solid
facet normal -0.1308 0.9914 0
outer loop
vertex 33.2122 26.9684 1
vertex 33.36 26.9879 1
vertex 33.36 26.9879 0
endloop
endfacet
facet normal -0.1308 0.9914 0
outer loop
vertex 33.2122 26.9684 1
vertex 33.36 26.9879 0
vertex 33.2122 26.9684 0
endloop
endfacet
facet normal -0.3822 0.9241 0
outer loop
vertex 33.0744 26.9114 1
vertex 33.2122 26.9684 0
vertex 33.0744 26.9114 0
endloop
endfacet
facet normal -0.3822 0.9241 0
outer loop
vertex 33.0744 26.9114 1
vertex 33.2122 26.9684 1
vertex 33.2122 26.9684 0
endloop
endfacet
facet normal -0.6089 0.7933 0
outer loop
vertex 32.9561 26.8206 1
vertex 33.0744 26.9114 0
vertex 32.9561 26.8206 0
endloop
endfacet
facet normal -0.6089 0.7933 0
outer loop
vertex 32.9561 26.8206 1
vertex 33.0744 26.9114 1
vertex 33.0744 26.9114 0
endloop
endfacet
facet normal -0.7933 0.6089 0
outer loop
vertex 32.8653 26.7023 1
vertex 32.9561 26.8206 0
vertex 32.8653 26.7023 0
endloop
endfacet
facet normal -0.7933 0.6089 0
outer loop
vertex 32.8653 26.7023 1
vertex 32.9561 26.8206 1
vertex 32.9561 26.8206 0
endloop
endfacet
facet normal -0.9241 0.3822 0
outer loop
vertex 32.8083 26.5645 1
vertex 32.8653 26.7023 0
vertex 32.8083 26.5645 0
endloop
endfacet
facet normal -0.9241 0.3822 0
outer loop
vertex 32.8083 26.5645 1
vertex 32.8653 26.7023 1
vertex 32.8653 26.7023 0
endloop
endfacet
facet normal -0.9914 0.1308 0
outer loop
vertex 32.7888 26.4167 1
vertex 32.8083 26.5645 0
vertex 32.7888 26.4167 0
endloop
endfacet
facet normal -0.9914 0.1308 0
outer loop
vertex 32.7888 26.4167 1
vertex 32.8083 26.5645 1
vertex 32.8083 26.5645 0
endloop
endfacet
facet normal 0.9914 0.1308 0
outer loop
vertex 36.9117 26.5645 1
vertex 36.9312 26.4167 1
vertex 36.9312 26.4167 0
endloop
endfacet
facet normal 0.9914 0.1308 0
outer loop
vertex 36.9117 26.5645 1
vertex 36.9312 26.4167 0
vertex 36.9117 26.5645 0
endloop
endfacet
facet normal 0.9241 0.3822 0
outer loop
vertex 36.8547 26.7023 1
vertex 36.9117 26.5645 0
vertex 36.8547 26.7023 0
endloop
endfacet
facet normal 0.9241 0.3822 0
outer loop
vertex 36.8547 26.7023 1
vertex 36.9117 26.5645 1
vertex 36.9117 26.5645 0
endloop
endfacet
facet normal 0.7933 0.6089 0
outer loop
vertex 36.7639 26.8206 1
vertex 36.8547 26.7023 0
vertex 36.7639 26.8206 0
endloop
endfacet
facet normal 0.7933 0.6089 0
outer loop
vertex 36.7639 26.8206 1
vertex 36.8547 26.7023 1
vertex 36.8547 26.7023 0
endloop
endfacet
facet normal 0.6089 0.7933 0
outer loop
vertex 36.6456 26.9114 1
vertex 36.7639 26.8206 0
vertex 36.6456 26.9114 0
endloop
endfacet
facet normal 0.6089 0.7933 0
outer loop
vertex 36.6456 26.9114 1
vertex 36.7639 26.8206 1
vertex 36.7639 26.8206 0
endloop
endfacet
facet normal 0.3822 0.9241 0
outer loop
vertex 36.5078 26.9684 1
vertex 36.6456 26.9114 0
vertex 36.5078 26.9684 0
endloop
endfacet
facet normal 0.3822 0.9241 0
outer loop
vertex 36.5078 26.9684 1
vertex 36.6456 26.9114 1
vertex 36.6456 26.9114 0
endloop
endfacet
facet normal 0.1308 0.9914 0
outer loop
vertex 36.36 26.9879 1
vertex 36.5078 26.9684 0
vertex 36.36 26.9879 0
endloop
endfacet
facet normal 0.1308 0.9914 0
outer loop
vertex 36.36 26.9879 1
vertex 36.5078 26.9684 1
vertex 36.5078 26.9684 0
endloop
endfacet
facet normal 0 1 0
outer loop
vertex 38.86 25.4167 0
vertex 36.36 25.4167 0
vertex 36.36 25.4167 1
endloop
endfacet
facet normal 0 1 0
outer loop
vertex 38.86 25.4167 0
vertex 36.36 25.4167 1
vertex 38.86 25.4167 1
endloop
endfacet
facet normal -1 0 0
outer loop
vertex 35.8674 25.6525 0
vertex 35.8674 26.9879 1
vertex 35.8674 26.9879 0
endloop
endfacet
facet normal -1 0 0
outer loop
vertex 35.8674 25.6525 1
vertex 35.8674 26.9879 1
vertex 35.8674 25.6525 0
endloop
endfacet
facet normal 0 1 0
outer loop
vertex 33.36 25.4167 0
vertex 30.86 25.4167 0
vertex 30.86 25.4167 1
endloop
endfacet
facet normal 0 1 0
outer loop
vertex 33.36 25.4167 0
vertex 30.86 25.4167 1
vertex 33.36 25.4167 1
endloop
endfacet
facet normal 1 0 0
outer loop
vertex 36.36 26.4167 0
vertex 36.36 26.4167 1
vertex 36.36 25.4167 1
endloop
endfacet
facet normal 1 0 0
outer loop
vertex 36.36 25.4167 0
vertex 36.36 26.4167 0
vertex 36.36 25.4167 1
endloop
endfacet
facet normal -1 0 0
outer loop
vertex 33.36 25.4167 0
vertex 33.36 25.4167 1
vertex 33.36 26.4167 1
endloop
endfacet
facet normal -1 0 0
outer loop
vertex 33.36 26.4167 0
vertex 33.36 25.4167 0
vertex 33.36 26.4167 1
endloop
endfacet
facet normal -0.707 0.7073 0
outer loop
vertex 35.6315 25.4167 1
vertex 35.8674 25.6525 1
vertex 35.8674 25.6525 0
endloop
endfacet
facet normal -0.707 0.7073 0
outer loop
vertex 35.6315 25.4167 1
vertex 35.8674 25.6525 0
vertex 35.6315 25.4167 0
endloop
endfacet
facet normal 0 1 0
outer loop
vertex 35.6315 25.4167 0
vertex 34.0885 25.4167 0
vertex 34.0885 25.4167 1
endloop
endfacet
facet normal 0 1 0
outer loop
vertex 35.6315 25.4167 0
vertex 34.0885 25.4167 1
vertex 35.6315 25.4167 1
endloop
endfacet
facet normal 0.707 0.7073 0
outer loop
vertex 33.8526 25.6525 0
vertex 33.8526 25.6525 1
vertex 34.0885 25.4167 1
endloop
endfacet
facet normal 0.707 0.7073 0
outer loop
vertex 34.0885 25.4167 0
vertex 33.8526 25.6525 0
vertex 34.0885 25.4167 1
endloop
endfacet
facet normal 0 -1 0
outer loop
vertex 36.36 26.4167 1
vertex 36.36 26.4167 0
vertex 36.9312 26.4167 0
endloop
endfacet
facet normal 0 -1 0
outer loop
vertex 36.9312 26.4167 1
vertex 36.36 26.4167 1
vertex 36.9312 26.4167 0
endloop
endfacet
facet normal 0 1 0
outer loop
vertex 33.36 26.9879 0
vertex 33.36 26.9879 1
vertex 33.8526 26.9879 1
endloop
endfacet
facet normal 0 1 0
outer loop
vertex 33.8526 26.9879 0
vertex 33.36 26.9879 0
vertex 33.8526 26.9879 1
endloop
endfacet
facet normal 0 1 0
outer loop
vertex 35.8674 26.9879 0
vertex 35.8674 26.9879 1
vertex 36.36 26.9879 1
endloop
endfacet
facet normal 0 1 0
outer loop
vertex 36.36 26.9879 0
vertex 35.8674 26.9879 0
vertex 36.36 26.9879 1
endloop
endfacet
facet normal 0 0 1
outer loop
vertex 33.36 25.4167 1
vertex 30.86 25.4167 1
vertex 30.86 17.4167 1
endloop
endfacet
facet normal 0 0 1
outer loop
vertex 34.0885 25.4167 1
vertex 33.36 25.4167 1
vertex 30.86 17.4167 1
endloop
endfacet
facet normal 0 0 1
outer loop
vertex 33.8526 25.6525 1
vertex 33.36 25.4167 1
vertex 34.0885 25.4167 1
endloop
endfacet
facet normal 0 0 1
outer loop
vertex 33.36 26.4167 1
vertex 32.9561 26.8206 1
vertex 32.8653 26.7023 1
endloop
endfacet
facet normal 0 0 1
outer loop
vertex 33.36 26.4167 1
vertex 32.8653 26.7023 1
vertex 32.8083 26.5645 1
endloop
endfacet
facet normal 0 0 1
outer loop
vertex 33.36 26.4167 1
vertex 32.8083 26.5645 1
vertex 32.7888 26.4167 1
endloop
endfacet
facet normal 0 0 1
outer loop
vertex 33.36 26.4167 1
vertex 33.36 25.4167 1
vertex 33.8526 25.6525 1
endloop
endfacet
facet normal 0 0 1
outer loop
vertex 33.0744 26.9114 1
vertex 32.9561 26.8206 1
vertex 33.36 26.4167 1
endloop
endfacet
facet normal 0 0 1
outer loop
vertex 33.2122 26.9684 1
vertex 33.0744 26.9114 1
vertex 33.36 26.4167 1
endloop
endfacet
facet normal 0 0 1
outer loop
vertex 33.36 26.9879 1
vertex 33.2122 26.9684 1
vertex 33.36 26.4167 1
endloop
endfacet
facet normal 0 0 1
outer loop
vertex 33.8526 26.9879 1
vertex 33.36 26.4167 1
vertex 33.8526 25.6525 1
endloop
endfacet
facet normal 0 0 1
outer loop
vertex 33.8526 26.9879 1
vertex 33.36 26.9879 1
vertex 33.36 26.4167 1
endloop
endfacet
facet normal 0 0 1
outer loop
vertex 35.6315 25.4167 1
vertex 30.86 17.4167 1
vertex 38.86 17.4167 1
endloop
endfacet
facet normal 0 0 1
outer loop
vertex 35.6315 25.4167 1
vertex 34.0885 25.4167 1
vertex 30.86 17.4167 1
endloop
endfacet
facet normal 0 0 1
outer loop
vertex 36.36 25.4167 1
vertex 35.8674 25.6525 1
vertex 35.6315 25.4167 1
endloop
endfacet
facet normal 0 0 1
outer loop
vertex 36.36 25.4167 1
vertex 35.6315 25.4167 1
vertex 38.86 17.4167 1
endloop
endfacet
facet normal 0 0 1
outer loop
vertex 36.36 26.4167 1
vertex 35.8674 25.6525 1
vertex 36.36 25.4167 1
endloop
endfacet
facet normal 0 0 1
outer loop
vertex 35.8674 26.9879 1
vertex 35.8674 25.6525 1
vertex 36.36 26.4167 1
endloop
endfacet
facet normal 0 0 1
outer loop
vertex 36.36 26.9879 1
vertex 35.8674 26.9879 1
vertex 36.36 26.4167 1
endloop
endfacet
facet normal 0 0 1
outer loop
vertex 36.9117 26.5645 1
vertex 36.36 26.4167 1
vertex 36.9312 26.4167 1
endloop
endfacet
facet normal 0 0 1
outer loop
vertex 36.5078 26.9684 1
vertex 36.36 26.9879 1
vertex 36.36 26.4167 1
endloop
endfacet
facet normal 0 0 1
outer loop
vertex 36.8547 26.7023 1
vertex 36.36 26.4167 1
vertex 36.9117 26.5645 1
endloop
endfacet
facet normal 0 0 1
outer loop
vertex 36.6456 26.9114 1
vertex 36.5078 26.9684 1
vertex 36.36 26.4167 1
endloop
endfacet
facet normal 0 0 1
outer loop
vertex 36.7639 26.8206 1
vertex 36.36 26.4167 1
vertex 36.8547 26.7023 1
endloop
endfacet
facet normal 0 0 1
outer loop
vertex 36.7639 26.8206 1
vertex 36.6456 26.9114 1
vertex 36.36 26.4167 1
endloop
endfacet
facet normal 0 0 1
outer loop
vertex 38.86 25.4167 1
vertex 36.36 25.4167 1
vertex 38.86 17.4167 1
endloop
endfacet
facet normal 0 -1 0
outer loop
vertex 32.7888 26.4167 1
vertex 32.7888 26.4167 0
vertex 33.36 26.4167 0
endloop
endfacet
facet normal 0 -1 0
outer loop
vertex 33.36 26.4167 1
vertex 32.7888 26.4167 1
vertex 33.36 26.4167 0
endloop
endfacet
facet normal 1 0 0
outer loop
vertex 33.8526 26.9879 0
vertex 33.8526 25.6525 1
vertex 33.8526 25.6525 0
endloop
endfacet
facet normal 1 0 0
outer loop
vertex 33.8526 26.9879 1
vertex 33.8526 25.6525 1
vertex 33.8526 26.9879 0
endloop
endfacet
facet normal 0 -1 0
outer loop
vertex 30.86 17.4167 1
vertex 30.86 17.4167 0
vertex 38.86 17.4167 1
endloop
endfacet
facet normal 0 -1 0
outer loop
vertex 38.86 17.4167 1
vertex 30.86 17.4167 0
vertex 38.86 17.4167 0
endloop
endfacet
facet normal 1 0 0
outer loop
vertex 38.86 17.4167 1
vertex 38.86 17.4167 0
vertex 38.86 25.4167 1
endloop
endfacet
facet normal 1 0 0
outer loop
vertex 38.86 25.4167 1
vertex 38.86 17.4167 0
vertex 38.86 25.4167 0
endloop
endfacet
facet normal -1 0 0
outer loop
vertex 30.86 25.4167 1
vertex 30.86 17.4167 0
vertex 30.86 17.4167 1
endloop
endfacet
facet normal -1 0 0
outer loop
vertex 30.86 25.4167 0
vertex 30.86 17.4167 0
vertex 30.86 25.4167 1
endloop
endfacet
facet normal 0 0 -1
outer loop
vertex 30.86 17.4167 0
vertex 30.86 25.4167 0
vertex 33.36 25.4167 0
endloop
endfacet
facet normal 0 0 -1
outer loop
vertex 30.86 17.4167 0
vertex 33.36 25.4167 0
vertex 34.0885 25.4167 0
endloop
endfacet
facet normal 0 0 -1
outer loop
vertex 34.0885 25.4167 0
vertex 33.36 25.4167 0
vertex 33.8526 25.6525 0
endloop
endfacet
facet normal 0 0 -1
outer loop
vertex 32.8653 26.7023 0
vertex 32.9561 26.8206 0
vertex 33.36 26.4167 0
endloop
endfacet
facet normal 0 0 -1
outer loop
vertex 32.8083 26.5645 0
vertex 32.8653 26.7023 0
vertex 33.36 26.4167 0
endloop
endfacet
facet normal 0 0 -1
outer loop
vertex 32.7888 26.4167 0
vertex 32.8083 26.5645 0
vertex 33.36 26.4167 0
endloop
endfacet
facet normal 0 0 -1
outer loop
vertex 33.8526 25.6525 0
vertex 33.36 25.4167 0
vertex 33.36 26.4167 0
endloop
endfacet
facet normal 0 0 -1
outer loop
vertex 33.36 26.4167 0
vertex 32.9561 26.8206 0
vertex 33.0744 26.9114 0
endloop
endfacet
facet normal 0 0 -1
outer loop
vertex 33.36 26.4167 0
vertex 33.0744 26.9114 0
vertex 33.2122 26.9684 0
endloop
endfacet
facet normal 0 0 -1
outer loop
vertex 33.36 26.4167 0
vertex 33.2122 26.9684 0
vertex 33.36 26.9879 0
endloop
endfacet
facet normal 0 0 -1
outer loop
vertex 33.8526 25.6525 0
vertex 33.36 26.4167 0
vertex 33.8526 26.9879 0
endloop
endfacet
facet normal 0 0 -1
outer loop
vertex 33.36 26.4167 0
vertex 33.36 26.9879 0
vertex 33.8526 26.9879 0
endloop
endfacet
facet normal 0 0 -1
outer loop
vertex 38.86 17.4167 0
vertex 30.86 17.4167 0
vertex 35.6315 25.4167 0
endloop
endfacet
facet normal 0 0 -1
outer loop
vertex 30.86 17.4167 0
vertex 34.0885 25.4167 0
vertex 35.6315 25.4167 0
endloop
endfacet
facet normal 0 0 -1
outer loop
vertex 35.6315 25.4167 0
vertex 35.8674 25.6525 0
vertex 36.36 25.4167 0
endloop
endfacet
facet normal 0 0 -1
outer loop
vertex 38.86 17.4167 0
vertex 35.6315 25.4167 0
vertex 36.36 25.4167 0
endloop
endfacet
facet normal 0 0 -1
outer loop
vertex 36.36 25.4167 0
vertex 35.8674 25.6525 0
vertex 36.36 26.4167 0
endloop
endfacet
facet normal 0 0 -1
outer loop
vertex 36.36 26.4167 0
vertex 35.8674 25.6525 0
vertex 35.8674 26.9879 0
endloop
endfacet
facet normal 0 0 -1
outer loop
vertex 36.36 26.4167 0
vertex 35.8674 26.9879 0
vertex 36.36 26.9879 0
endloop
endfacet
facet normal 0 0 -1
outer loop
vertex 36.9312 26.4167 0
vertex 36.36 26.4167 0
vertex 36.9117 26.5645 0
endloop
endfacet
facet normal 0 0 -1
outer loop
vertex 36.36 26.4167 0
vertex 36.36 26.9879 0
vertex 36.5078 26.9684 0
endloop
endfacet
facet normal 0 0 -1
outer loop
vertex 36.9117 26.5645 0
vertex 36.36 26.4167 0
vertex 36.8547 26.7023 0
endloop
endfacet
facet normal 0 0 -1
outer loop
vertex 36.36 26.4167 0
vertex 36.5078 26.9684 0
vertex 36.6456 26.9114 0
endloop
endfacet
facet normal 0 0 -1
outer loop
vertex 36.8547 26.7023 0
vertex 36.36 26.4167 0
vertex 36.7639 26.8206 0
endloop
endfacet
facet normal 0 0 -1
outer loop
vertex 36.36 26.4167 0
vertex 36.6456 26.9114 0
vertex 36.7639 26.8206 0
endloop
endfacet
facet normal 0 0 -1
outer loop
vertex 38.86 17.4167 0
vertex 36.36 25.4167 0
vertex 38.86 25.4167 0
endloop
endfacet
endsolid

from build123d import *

# Parameters (mm, degrees)
EXTRUDE007_DEPTH = 1
BOX003_W         = 8
BOX003_H         = 8
BOX003_DEPTH     = 1


with BuildPart() as snapsnapextrude:
    # Sketch006 (on Face6 of Box003) → Extrude007 (new body)
    with BuildSketch(Plane(origin=(30.86, 17.4167, 1), x_dir=(1, 0, 0), z_dir=(0, 0, 1))):
        with BuildLine():
            Line((5.5, 9), (5.5, 8))
            Line((4.771508, 8), (5.5, 8))
            Line((5.007358, 8.23585), (4.771508, 8))
            Line((5.007358, 9.571194), (5.007358, 8.23585))
            Line((5.007358, 9.571194), (5.5, 9.571194))
            ThreePointArc((6.071194, 9), (5.903895, 9.403895), (5.5, 9.571194))
            Line((5.5, 9), (6.071194, 9))
        make_face()
        with BuildLine():
            Line((2.5, 8), (2.5, 9))
            Line((1.928806, 9), (2.5, 9))
            ThreePointArc((2.5, 9.571194), (2.096105, 9.403895), (1.928806, 9))
            Line((2.5, 9.571194), (2.992642, 9.571194))
            Line((2.992642, 8.23585), (2.992642, 9.571194))
            Line((2.992642, 8.23585), (3.228492, 8))
            Line((2.5, 8), (3.228492, 8))
        make_face()
    extrude(amount=-EXTRUDE007_DEPTH)


with BuildPart() as snapsnap:
    # Box003 → Box003 (new body)
    with BuildSketch(Plane(origin=(30.86, 17.4167, 0), x_dir=(1, 0, 0), z_dir=(0, 0, 1))):
        with Locations((4, 4)):
            Rectangle(BOX003_W, BOX003_H)
    extrude(amount=BOX003_DEPTH)

    # Fusion: union snapSnapExtrude
    add(snapsnapextrude.part)


solid = snapsnap.part
